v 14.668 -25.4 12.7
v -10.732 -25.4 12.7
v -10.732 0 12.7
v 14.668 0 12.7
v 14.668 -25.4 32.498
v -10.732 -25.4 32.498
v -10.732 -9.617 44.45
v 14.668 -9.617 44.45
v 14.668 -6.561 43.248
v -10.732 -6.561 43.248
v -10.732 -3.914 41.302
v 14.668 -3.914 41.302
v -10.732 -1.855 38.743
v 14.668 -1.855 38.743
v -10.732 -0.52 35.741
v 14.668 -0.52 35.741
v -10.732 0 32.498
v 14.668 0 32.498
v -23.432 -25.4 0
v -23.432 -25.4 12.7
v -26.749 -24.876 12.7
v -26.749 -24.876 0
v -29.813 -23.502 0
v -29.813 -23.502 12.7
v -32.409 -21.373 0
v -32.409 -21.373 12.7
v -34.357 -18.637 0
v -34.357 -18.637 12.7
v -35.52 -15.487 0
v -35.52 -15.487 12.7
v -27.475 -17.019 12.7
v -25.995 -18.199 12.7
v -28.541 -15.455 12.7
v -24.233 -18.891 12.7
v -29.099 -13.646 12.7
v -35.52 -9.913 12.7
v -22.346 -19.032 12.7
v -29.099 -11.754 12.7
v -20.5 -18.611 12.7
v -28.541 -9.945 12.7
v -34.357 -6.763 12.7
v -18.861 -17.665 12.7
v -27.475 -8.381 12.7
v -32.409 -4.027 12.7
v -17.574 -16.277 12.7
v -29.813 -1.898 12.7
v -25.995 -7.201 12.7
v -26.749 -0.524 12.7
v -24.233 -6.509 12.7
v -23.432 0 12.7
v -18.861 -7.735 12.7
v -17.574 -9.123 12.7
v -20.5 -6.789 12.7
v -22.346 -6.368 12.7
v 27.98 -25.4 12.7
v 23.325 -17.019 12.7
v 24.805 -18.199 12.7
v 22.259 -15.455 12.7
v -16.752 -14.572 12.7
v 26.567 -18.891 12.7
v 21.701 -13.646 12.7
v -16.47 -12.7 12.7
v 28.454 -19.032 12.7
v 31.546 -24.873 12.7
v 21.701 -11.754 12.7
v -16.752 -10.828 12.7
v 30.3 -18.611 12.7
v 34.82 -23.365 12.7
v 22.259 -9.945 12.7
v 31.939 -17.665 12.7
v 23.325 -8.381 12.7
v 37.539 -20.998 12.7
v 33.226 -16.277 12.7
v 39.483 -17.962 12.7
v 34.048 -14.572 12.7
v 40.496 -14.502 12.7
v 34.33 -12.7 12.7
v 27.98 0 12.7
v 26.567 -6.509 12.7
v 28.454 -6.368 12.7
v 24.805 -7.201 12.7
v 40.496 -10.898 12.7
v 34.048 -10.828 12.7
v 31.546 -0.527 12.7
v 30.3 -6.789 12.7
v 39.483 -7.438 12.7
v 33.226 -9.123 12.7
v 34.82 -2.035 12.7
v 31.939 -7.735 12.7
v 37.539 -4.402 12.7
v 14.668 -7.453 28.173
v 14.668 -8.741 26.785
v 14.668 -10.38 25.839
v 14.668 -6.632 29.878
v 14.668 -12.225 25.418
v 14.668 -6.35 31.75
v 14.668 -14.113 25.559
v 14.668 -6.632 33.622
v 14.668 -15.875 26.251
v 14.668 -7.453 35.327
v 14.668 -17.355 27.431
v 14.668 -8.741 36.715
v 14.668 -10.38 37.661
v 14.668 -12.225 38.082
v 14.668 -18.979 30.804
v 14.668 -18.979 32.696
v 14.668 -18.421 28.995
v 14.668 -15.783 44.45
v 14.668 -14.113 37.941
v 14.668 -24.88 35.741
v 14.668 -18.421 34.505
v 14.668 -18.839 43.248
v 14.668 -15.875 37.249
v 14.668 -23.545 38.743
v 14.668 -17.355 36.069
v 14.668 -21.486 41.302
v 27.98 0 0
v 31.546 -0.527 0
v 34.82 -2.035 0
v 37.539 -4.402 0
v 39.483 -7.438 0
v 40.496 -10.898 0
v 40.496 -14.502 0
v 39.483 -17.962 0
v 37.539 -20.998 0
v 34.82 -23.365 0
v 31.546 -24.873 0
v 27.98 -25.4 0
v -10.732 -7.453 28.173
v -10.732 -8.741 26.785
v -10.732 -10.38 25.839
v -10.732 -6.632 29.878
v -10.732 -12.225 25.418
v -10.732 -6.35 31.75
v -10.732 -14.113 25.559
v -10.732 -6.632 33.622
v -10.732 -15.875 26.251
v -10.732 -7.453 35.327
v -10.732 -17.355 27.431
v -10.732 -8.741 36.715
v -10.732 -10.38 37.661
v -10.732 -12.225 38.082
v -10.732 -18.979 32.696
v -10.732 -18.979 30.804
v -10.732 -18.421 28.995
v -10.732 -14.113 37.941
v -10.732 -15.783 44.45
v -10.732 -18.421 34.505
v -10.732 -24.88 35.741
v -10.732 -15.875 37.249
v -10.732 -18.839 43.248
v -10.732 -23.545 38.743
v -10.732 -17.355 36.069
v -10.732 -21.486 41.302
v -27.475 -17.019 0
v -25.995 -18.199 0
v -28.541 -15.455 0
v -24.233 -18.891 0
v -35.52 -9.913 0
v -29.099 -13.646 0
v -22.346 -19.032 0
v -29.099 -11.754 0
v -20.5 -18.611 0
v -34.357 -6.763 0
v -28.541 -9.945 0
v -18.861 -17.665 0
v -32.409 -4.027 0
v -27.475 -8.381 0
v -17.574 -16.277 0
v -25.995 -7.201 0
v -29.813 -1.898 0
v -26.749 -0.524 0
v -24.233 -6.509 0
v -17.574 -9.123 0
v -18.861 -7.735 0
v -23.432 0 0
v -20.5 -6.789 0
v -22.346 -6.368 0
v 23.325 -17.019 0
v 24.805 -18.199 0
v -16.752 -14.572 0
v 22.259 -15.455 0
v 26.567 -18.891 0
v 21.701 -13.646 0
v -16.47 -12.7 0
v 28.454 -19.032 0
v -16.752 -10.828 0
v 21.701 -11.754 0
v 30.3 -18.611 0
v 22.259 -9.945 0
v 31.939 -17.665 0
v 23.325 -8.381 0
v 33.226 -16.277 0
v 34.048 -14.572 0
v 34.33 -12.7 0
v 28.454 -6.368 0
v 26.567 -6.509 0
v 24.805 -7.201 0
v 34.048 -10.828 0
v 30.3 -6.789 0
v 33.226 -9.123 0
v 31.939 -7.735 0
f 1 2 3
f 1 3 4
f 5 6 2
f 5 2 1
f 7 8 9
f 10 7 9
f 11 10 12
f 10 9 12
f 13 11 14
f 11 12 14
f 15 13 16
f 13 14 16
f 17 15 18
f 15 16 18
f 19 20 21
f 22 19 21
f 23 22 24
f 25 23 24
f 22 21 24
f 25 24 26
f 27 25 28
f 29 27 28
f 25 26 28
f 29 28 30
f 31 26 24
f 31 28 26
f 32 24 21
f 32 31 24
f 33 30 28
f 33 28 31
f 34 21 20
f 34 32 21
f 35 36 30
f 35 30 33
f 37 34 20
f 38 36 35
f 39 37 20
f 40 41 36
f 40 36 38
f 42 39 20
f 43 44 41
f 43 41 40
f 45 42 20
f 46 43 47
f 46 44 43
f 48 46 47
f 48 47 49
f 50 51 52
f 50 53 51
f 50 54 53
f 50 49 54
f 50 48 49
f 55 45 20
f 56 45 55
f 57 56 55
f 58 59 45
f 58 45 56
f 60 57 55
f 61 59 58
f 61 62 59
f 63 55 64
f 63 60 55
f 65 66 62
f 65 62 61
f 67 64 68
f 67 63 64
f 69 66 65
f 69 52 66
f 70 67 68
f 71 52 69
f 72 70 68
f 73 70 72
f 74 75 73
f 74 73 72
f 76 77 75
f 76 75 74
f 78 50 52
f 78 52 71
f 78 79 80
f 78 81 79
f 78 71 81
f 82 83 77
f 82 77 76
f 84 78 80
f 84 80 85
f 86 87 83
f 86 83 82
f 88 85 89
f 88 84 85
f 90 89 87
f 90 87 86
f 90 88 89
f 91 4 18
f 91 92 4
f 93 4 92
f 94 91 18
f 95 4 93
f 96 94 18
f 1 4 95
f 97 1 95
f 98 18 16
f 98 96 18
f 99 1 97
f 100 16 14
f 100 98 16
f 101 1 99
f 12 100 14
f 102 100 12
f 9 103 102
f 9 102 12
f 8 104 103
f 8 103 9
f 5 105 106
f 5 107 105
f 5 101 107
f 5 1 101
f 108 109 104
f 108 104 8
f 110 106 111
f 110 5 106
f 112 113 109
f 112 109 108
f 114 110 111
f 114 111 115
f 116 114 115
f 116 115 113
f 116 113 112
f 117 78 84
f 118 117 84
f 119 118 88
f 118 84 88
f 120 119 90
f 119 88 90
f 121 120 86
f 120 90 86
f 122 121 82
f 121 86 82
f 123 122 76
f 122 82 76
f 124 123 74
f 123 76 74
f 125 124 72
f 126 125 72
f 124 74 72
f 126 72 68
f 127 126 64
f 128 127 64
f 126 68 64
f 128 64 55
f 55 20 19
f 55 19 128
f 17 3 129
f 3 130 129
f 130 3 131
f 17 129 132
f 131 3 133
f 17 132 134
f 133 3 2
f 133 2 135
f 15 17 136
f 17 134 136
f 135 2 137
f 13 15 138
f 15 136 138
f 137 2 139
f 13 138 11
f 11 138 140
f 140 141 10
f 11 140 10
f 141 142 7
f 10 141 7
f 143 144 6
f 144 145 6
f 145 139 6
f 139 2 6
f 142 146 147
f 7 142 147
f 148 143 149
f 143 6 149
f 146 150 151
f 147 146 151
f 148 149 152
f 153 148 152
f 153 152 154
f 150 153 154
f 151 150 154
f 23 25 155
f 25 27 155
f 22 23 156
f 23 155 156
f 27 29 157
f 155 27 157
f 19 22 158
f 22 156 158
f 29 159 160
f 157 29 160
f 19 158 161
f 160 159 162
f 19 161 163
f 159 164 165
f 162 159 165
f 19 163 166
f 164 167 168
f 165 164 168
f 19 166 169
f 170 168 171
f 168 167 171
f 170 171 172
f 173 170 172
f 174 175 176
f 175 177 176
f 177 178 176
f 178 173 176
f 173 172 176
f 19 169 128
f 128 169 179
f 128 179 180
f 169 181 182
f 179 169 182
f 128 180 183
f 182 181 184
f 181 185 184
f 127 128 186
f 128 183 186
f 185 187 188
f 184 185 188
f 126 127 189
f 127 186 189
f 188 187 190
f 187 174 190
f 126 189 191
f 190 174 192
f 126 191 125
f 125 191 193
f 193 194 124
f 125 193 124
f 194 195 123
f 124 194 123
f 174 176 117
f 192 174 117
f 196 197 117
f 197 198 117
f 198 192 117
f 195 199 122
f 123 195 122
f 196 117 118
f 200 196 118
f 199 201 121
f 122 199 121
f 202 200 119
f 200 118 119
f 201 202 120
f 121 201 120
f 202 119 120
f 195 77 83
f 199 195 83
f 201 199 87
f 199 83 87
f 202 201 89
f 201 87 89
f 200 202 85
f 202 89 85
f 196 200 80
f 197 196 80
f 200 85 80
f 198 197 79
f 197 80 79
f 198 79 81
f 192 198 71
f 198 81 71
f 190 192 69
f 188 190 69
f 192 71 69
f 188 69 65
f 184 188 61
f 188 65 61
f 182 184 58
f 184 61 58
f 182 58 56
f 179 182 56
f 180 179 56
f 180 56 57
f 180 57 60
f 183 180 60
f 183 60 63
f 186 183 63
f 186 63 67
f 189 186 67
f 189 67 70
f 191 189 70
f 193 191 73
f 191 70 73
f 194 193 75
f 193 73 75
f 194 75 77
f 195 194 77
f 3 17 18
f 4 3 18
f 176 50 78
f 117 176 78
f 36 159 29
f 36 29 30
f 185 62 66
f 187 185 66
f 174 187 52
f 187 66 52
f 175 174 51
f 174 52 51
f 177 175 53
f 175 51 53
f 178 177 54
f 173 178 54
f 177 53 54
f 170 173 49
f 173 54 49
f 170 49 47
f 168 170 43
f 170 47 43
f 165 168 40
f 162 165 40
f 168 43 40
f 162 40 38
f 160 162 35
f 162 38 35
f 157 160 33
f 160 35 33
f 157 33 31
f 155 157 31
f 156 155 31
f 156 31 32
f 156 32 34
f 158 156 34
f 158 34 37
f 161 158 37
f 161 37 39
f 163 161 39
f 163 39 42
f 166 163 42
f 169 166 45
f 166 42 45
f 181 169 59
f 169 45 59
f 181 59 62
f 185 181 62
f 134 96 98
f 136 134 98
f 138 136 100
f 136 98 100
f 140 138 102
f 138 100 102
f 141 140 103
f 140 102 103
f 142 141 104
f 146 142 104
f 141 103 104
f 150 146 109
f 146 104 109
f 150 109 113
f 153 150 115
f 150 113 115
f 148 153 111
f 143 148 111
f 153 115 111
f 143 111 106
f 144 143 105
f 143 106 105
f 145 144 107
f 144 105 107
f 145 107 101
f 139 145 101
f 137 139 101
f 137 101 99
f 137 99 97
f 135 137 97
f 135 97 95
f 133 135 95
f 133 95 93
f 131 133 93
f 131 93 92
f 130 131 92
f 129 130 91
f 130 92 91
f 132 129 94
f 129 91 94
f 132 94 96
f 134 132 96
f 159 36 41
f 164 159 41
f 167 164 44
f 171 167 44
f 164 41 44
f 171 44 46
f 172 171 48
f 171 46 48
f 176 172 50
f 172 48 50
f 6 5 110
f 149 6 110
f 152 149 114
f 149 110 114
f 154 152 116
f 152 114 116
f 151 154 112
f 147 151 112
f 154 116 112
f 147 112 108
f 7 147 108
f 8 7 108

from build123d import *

# Parameters (mm, degrees)
F0_W     = 76.2
F0_H     = 12.7
F1_DEPTH = 25.4
F2_R     = 6.35
F3_DEPTH = 12.7
F4_W     = 25.4
F4_H     = 31.75
F5_DEPTH = 25.4
F6_R     = 6.35
F7_DEPTH = 25.4


with BuildPart() as f1:
    # F0 (on Front) → F1 (new body)
    with BuildSketch(Plane.XZ):
        with Locations((2.5796875684, 6.35)):
            Rectangle(F0_W, F0_H)
    extrude(amount=F1_DEPTH)

    # F2 (on face) → F3 (cut)
    with BuildSketch(Plane.XY.offset(12.7)):
        with Locations((-22.8203124316, -12.7)):
            Circle(F2_R)
        with Locations((27.9796875684, -12.7)):
            Circle(F2_R)
        with BuildLine():
            Line((40.6796875684, 0), (27.9796875684, 0))
            ThreePointArc((27.9796875684, 0), (40.6249785715, -12.7), (27.9796875684, -25.4))
            Line((27.9796875684, -25.4), (40.6796875684, -25.4))
            Line((40.6796875684, -25.4), (40.6796875684, 0))
        make_face()
        with BuildLine():
            ThreePointArc((-35.5203124316, -9.9125084794), (-31.1814662456, -2.8767304466), (-23.4321320361, 0))
            Line((-23.4321320361, 0), (-35.5203124316, 0))
            Line((-35.5203124316, 0), (-35.5203124316, -9.9125084794))
        make_face()
        with BuildLine():
            ThreePointArc((-23.4321320361, -25.4), (-31.1814662456, -22.5232695534), (-35.5203124316, -15.4874915206))
            Line((-35.5203124316, -15.4874915206), (-35.5203124316, -25.4))
            Line((-35.5203124316, -25.4), (-23.4321320361, -25.4))
        make_face()
    extrude(amount=-F3_DEPTH, mode=Mode.SUBTRACT)


with BuildPart() as f5:
    # F4 (on face) → F5 (new body)
    with BuildSketch(Plane.XZ.offset(25.4)):
        with Locations((1.9678679639, 28.575)):
            Rectangle(F4_W, F4_H)
    extrude(amount=-F5_DEPTH)

    # F6 (on face) → F7 (cut)
    with BuildSketch(Plane.YZ.offset(14.6678679639)):
        with Locations((-12.7, 31.75)):
            Circle(F6_R)
        with BuildLine():
            ThreePointArc((-9.6174810531, 44.45), (-2.8013405469, 40.0894216751), (0, 32.4981829179))
            Line((0, 32.4981829179), (0, 44.45))
            Line((0, 44.45), (-9.6174810531, 44.45))
        make_face()
        with BuildLine():
            ThreePointArc((-25.4, 32.4981829179), (-22.5986594531, 40.0894216751), (-15.7825189469, 44.45))
            Line((-15.7825189469, 44.45), (-25.4, 44.45))
            Line((-25.4, 44.45), (-25.4, 32.4981829179))
        make_face()
    extrude(amount=-F7_DEPTH, mode=Mode.SUBTRACT)


solid = Compound([f1.part, f5.part])
